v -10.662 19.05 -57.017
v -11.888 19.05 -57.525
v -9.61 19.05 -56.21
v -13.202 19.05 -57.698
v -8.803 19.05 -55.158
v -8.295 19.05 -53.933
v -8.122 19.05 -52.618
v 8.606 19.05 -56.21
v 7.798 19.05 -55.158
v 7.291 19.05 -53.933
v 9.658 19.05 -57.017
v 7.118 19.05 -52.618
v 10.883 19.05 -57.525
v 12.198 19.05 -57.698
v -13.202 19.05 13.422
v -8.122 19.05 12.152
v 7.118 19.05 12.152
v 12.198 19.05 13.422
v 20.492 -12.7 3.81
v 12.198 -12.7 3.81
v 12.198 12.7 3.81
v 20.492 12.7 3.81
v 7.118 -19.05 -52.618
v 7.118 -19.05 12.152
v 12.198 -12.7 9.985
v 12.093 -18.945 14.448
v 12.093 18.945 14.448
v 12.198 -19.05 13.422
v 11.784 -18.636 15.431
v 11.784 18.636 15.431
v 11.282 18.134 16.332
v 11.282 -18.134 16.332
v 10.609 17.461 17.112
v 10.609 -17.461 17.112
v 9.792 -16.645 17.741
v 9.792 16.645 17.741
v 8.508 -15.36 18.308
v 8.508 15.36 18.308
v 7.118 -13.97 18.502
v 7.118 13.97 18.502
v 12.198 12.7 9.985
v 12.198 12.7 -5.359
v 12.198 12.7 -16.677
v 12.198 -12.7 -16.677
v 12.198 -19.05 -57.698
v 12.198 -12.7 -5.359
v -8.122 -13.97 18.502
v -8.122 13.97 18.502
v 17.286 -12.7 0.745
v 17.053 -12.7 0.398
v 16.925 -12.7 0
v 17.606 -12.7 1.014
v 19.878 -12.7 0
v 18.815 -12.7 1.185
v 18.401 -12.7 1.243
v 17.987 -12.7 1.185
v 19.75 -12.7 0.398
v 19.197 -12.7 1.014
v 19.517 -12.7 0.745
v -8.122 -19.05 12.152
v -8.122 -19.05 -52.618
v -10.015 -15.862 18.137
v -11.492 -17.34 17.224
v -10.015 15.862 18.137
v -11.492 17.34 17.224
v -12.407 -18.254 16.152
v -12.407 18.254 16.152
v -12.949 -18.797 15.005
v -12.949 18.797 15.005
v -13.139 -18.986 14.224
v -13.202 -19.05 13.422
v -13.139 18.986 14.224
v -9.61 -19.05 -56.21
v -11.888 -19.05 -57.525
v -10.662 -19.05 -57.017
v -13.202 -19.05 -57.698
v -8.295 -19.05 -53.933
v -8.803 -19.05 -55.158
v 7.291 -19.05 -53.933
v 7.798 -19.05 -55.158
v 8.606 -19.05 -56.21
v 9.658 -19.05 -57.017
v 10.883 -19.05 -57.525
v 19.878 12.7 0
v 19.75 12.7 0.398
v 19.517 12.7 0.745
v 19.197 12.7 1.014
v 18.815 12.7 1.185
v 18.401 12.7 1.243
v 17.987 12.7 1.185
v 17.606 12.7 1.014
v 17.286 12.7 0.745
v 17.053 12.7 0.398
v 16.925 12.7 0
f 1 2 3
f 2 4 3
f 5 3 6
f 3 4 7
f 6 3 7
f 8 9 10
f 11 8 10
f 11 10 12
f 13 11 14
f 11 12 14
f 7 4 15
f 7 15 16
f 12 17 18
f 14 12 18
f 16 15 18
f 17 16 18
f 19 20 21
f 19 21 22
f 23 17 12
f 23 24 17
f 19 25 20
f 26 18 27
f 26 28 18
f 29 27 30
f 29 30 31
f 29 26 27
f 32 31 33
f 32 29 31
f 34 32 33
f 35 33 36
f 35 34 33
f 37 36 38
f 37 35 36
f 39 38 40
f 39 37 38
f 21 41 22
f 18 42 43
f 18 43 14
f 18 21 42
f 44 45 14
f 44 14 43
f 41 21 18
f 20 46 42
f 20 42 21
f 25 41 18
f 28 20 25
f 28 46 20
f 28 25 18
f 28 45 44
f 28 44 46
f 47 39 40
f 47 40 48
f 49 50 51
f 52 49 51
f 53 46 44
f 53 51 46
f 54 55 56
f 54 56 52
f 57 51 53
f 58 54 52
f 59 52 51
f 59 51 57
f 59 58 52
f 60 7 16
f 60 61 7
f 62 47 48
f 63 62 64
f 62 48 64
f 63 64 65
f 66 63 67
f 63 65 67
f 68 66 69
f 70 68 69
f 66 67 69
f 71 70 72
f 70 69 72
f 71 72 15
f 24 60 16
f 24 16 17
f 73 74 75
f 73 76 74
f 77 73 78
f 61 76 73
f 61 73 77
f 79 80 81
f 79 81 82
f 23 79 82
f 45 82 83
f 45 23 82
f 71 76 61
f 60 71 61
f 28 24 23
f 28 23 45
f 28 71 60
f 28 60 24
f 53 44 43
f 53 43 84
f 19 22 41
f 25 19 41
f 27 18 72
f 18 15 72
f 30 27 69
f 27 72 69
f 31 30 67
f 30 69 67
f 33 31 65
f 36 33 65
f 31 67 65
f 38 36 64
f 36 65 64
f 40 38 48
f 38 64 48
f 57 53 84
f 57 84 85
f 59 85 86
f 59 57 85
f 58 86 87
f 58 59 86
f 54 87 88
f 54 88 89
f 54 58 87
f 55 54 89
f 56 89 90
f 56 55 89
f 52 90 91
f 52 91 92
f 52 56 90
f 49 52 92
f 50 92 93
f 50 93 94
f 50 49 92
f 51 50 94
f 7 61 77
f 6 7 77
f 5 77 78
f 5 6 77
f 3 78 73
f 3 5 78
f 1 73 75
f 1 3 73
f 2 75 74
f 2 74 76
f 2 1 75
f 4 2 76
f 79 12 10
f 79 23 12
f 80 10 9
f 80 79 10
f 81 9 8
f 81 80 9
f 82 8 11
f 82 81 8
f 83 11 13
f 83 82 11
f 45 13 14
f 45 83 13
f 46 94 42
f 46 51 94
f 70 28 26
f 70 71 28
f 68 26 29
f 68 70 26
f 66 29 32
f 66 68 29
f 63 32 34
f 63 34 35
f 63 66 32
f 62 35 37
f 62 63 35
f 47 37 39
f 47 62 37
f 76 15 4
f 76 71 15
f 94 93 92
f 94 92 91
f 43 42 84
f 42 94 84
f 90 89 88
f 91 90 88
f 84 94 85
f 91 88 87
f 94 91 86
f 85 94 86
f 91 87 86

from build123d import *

# Parameters (mm, degrees)
F1_DEPTH = 19.05
F2_DEPTH = 12.7
F3_R     = 5.07999


# Not quite as in the source:
# - a fillet or chamfer is up to 0.001 mm smaller than in the source, because OpenCascade refuses the exact size


with BuildPart() as f1:
    # F0 (on Front) → F1 (new body, symmetric)
    with BuildSketch(Plane.XZ):
        Polygon((-8.1223546189, -57.6977613127), (-8.1223546189, 12.1522386873), (7.1176453811, 12.1522386873), (7.1176453811, -57.6977613127), (12.1976453811, -57.6977613127), (12.1976453811, -16.6773311794), (12.1976453811, -5.3586508704), (12.1976453811, 3.81), (12.1976453811, 9.9853777035), (12.1976453811, 18.5022386873), (-13.2023546189, 18.5022386873), (-13.2023546189, -57.6977613127), align=None)
    extrude(amount=F1_DEPTH, both=True)

    # F0 (on Front) → F2 (join, symmetric)
    with BuildSketch(Plane.XZ):
        Polygon((20.4923357815, 3.81), (12.1976453811, 9.9853777035), (12.1976453811, 3.81), (16.9246122241, 3.81), align=None)
        Polygon((12.1976453811, -5.3586508704), (12.1976453811, -16.6773311794), (19.8778546898, 0), (16.9246122241, 0), align=None)
        with BuildLine():
            Line((16.9246122241, 0), (19.8778546898, 0))
            ThreePointArc((19.8778546898, 0), (18.401233457, 1.2428820016), (16.9246122241, 0))
        make_face()
    extrude(amount=F2_DEPTH, both=True)

    # F3 (radius 5.08 in the source; OpenCascade refuses exactly that, so slightly less here)
    f3_edges = [f1.edges().sort_by_distance(p)[0] for p in [
        (12.197645, 0, 18.502239),
        (-13.202355, 0, 18.502239),
        (-0.502355, -19.05, 18.502239),
        (-0.502355, 19.05, 18.502239),
        (7.117645, 0, -57.697761),
        (-8.122355, 0, -57.697761),
    ]]
    fillet(f3_edges, radius=F3_R)


solid = f1.part
